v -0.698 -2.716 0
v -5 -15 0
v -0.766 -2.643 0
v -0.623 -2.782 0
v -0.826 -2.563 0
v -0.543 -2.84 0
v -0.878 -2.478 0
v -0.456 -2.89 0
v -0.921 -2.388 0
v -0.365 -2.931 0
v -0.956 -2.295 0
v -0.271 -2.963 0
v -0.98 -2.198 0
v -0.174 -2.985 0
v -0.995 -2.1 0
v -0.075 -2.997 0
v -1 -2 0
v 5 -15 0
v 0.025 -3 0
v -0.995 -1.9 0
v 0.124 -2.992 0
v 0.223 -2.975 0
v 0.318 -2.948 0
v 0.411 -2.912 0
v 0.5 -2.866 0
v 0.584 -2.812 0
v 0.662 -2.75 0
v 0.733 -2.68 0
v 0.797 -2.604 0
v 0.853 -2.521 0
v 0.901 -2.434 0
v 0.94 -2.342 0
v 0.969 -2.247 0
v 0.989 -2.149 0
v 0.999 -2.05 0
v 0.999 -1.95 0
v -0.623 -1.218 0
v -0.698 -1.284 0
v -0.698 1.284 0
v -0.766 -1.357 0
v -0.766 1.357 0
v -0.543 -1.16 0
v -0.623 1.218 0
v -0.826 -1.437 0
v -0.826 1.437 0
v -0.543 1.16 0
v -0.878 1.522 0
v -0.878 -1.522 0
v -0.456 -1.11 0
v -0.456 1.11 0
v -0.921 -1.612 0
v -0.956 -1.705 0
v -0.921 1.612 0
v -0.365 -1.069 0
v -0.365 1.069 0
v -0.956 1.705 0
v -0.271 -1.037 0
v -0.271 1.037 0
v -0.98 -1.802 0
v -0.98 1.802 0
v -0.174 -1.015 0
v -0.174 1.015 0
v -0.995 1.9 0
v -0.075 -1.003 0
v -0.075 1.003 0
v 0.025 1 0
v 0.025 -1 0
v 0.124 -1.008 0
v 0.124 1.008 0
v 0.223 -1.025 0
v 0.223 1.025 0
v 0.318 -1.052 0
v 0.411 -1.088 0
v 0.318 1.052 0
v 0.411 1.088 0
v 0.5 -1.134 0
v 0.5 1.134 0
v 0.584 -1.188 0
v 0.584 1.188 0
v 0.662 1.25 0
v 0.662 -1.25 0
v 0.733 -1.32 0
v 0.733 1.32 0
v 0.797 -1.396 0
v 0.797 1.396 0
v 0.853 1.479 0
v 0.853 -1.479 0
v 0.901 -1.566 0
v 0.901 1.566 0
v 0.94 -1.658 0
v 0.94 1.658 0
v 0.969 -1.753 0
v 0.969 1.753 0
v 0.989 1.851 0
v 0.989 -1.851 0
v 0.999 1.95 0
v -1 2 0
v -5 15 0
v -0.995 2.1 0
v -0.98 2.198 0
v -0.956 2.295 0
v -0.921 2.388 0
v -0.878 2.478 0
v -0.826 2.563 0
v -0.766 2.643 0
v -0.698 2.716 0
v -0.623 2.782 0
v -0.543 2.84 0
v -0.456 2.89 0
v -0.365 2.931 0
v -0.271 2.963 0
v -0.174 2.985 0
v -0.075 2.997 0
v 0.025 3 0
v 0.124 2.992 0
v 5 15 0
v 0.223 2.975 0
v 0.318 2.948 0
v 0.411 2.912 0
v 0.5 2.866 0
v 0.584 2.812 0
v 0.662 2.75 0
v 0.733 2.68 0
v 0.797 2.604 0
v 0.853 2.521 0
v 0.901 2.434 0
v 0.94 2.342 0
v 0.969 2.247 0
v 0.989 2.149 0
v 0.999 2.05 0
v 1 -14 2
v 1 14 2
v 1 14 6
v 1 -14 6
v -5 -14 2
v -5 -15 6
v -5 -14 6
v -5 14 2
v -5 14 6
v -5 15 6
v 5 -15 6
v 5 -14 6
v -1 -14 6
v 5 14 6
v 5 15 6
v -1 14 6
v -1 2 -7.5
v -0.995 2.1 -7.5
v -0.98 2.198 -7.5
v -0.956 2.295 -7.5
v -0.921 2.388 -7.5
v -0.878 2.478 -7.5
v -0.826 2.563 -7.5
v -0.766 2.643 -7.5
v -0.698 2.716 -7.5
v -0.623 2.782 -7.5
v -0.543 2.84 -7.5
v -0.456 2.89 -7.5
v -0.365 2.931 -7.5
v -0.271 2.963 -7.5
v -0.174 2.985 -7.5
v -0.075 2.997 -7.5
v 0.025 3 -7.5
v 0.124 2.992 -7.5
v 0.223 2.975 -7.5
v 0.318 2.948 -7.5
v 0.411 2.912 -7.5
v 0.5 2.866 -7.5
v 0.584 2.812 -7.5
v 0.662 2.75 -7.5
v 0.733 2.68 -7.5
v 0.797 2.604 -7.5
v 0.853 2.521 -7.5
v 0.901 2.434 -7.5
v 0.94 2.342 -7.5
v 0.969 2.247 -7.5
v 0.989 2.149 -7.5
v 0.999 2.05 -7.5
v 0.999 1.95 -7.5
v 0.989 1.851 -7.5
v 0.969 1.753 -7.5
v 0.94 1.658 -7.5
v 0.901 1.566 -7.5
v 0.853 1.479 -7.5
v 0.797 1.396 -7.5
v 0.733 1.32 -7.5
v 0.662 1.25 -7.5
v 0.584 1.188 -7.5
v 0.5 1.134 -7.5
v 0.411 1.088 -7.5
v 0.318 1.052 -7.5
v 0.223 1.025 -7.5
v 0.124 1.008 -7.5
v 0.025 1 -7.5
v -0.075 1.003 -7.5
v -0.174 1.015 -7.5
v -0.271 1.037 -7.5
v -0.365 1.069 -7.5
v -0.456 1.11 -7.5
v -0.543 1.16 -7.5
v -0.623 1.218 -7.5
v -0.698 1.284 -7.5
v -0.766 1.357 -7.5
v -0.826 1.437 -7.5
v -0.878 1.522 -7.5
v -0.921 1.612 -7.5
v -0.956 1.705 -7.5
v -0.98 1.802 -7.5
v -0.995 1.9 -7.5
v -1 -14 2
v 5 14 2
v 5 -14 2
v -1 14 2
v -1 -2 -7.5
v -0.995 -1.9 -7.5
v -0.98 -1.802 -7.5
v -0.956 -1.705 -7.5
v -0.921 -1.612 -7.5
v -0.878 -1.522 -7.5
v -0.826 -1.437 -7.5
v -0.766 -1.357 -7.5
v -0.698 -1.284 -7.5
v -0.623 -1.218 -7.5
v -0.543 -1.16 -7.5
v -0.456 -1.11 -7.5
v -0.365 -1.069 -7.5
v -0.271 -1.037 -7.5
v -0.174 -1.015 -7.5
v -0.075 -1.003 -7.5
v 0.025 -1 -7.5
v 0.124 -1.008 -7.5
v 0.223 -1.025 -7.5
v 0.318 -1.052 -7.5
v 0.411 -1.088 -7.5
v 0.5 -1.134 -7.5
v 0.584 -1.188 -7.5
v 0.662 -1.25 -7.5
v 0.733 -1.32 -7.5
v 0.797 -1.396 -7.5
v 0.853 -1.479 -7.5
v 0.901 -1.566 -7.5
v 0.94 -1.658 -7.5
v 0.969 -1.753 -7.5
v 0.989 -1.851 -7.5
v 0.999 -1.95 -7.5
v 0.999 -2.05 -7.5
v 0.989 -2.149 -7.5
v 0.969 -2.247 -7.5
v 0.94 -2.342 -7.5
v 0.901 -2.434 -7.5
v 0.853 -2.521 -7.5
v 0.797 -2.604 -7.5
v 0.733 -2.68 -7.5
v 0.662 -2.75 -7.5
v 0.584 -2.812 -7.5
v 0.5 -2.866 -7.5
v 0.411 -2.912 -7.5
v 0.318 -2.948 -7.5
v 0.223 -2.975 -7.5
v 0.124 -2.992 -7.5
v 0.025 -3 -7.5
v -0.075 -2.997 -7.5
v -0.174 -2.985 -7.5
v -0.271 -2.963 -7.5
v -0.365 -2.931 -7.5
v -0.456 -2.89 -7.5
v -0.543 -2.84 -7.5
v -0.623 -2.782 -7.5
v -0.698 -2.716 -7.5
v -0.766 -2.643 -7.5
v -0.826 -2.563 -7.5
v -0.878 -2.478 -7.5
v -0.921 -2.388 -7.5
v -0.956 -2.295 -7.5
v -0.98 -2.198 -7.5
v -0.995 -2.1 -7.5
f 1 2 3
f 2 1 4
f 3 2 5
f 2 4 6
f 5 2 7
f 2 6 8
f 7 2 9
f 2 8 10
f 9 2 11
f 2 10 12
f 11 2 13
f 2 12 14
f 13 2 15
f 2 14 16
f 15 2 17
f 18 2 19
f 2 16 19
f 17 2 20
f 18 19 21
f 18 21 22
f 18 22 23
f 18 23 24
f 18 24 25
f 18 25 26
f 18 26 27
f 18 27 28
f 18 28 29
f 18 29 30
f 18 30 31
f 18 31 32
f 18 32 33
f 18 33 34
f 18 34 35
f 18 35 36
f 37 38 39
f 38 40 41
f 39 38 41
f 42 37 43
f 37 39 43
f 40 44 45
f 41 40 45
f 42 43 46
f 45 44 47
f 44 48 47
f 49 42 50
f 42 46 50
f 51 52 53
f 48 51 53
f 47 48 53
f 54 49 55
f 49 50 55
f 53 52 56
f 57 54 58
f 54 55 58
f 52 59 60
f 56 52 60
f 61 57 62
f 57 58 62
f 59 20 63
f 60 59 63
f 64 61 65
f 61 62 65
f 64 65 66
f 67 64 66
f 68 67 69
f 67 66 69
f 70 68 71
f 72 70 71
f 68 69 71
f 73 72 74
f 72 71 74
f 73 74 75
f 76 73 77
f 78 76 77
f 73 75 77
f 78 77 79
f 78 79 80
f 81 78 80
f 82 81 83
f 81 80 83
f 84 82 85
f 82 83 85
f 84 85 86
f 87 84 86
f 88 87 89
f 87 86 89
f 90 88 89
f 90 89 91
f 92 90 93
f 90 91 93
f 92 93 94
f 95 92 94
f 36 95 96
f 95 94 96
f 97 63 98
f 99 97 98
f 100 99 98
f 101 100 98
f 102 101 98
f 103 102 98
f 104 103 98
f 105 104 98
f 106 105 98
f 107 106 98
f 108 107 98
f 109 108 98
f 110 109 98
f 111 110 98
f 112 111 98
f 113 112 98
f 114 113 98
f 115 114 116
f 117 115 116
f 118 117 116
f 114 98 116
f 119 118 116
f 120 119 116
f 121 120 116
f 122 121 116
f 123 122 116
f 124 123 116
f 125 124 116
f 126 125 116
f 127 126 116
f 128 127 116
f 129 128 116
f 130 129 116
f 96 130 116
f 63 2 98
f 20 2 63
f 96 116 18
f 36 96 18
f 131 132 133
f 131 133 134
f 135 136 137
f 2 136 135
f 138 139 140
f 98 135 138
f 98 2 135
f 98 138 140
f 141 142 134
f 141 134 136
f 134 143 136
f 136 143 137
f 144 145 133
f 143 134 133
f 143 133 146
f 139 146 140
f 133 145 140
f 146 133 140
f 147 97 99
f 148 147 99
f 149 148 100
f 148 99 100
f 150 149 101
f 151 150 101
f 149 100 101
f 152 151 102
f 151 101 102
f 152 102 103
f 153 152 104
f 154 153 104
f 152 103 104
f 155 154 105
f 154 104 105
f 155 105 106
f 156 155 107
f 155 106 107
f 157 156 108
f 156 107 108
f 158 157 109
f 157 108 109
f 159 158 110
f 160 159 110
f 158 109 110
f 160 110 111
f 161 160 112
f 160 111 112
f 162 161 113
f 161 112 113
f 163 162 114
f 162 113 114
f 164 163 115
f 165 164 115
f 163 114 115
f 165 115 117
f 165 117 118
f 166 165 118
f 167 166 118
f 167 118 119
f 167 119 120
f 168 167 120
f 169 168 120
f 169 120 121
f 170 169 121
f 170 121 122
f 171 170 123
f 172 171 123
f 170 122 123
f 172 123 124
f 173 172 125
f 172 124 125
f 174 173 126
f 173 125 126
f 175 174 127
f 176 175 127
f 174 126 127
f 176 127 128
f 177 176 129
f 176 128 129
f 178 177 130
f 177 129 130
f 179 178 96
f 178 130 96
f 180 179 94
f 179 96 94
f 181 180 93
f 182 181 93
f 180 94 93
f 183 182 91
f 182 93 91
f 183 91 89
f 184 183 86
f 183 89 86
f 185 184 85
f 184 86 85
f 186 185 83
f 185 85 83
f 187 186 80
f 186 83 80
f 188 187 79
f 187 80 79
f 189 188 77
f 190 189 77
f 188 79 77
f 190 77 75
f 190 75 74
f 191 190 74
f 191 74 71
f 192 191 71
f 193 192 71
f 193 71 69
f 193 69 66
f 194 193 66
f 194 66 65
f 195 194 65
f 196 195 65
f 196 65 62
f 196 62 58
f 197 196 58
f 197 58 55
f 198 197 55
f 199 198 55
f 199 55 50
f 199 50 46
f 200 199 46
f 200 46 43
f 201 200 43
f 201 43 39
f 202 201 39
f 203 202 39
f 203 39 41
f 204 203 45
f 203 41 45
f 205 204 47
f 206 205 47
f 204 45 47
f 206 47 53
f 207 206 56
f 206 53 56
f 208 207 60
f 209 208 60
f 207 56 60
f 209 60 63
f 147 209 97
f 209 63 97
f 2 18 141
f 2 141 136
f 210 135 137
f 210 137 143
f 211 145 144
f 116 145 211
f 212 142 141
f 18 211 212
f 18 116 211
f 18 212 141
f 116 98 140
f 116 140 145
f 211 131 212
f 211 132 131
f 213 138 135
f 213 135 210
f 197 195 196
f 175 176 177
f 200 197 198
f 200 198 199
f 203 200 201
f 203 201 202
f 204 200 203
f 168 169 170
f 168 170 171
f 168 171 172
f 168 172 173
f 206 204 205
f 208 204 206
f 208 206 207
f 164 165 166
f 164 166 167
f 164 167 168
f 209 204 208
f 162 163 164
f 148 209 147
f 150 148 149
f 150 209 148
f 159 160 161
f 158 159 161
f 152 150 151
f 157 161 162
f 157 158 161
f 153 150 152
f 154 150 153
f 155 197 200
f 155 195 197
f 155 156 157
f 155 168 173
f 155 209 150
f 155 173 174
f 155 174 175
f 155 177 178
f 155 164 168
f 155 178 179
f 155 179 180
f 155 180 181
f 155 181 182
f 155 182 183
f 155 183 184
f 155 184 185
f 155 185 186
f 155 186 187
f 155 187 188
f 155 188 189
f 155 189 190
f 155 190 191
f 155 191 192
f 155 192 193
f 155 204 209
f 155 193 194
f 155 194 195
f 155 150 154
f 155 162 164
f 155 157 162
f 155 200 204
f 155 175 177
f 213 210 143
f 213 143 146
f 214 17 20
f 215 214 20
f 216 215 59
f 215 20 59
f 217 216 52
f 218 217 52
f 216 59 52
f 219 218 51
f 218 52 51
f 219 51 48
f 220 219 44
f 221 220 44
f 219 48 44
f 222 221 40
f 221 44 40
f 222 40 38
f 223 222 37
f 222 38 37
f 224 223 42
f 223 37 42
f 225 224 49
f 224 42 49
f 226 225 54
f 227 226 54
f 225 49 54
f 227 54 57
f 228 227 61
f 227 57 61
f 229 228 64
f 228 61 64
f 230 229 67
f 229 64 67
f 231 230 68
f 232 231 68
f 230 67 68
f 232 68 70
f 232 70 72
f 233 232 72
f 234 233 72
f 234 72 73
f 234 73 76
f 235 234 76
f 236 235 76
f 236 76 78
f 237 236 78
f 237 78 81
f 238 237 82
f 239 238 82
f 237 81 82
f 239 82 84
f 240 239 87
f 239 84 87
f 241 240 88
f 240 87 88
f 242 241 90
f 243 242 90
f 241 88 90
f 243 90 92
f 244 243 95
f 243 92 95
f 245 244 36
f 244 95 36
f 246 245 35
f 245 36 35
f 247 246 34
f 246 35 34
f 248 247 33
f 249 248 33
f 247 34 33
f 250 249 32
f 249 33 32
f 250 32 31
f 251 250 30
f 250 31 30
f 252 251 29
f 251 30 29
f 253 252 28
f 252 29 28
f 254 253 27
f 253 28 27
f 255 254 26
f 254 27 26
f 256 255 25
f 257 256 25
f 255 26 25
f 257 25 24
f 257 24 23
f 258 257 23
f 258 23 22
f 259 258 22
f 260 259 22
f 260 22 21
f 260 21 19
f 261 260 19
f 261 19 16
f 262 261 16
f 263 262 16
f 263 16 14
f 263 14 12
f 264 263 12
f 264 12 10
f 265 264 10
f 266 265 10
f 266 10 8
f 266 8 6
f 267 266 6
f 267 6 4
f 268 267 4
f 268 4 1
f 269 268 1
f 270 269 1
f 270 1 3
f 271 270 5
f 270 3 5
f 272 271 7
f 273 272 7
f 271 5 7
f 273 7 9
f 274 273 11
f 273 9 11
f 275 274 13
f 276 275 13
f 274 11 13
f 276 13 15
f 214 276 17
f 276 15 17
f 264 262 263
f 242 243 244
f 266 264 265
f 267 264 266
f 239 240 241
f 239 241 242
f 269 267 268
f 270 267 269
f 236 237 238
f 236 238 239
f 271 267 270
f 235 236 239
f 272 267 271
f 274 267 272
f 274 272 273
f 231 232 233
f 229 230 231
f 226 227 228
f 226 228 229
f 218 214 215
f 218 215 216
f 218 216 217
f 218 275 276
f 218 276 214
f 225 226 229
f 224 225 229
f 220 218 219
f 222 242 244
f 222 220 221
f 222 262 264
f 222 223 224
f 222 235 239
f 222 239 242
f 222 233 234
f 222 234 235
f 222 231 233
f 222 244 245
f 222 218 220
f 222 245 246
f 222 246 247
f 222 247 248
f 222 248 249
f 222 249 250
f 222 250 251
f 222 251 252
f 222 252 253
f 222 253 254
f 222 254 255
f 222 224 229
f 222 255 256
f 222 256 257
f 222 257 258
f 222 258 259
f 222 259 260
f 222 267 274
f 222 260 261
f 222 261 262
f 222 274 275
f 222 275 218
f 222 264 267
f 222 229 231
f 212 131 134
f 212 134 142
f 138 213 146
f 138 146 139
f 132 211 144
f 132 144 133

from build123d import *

# Parameters (mm, degrees)
SKETCH1_W           = 10
SKETCH1_H           = 30
BOSS_EXTRUDE1_DEPTH = 2
BOSS_EXTRUDE2_DEPTH = 4
SKETCH4_R           = 1
BOSS_EXTRUDE3_DEPTH = 7.5


with BuildPart() as part:
    # Sketch1 → Boss-Extrude1 (new body)
    with BuildSketch(Plane.XY):
        Rectangle(SKETCH1_W, SKETCH1_H)
    extrude(amount=BOSS_EXTRUDE1_DEPTH)

    # Sketch2 → Boss-Extrude2 (add)
    with BuildSketch(Plane.XY.offset(2)):
        Polygon((1, 14), (1, -14), (5, -14), (5, -15), (-5, -15), (-5, -14), (-1, -14), (-1, 14), (-5, 14), (-5, 15), (5, 15), (5, 14), align=None)
    extrude(amount=BOSS_EXTRUDE2_DEPTH)

    # Sketch4 → Boss-Extrude3 (add)
    with BuildSketch(Plane(origin=(0, 0, 0), x_dir=(-1, 0, 0), z_dir=(0, 0, -1))):
        with Locations((0, 2)):
            Circle(SKETCH4_R)
        with Locations((0, -2)):
            Circle(SKETCH4_R)
    extrude(amount=BOSS_EXTRUDE3_DEPTH)


solid = part.part
